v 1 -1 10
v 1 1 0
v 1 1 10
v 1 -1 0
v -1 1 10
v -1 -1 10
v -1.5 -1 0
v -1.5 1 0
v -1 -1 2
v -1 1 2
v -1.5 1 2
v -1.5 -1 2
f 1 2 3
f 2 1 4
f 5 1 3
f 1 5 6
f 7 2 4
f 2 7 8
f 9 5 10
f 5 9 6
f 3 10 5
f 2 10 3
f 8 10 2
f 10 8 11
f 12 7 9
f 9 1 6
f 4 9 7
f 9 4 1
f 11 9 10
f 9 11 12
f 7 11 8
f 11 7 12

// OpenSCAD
translate([0, 0, 5]) color([0,1,0,0.9]) cube([2, 2, 10], center=true);
translate([-1.25, -0.75, 1]) color([1,0,0]) cube([0.5, 0.5, 2], center=true);
translate([-1.25, -0.25, 1]) color([1,0,0]) cube([0.5, 0.5, 2], center=true);
translate([-1.25, 0.25, 1]) color([1,0,0]) cube([0.5, 0.5, 2], center=true);
translate([-1.25, 0.75, 1]) color([1,0,0]) cube([0.5, 0.5, 2], center=true);
